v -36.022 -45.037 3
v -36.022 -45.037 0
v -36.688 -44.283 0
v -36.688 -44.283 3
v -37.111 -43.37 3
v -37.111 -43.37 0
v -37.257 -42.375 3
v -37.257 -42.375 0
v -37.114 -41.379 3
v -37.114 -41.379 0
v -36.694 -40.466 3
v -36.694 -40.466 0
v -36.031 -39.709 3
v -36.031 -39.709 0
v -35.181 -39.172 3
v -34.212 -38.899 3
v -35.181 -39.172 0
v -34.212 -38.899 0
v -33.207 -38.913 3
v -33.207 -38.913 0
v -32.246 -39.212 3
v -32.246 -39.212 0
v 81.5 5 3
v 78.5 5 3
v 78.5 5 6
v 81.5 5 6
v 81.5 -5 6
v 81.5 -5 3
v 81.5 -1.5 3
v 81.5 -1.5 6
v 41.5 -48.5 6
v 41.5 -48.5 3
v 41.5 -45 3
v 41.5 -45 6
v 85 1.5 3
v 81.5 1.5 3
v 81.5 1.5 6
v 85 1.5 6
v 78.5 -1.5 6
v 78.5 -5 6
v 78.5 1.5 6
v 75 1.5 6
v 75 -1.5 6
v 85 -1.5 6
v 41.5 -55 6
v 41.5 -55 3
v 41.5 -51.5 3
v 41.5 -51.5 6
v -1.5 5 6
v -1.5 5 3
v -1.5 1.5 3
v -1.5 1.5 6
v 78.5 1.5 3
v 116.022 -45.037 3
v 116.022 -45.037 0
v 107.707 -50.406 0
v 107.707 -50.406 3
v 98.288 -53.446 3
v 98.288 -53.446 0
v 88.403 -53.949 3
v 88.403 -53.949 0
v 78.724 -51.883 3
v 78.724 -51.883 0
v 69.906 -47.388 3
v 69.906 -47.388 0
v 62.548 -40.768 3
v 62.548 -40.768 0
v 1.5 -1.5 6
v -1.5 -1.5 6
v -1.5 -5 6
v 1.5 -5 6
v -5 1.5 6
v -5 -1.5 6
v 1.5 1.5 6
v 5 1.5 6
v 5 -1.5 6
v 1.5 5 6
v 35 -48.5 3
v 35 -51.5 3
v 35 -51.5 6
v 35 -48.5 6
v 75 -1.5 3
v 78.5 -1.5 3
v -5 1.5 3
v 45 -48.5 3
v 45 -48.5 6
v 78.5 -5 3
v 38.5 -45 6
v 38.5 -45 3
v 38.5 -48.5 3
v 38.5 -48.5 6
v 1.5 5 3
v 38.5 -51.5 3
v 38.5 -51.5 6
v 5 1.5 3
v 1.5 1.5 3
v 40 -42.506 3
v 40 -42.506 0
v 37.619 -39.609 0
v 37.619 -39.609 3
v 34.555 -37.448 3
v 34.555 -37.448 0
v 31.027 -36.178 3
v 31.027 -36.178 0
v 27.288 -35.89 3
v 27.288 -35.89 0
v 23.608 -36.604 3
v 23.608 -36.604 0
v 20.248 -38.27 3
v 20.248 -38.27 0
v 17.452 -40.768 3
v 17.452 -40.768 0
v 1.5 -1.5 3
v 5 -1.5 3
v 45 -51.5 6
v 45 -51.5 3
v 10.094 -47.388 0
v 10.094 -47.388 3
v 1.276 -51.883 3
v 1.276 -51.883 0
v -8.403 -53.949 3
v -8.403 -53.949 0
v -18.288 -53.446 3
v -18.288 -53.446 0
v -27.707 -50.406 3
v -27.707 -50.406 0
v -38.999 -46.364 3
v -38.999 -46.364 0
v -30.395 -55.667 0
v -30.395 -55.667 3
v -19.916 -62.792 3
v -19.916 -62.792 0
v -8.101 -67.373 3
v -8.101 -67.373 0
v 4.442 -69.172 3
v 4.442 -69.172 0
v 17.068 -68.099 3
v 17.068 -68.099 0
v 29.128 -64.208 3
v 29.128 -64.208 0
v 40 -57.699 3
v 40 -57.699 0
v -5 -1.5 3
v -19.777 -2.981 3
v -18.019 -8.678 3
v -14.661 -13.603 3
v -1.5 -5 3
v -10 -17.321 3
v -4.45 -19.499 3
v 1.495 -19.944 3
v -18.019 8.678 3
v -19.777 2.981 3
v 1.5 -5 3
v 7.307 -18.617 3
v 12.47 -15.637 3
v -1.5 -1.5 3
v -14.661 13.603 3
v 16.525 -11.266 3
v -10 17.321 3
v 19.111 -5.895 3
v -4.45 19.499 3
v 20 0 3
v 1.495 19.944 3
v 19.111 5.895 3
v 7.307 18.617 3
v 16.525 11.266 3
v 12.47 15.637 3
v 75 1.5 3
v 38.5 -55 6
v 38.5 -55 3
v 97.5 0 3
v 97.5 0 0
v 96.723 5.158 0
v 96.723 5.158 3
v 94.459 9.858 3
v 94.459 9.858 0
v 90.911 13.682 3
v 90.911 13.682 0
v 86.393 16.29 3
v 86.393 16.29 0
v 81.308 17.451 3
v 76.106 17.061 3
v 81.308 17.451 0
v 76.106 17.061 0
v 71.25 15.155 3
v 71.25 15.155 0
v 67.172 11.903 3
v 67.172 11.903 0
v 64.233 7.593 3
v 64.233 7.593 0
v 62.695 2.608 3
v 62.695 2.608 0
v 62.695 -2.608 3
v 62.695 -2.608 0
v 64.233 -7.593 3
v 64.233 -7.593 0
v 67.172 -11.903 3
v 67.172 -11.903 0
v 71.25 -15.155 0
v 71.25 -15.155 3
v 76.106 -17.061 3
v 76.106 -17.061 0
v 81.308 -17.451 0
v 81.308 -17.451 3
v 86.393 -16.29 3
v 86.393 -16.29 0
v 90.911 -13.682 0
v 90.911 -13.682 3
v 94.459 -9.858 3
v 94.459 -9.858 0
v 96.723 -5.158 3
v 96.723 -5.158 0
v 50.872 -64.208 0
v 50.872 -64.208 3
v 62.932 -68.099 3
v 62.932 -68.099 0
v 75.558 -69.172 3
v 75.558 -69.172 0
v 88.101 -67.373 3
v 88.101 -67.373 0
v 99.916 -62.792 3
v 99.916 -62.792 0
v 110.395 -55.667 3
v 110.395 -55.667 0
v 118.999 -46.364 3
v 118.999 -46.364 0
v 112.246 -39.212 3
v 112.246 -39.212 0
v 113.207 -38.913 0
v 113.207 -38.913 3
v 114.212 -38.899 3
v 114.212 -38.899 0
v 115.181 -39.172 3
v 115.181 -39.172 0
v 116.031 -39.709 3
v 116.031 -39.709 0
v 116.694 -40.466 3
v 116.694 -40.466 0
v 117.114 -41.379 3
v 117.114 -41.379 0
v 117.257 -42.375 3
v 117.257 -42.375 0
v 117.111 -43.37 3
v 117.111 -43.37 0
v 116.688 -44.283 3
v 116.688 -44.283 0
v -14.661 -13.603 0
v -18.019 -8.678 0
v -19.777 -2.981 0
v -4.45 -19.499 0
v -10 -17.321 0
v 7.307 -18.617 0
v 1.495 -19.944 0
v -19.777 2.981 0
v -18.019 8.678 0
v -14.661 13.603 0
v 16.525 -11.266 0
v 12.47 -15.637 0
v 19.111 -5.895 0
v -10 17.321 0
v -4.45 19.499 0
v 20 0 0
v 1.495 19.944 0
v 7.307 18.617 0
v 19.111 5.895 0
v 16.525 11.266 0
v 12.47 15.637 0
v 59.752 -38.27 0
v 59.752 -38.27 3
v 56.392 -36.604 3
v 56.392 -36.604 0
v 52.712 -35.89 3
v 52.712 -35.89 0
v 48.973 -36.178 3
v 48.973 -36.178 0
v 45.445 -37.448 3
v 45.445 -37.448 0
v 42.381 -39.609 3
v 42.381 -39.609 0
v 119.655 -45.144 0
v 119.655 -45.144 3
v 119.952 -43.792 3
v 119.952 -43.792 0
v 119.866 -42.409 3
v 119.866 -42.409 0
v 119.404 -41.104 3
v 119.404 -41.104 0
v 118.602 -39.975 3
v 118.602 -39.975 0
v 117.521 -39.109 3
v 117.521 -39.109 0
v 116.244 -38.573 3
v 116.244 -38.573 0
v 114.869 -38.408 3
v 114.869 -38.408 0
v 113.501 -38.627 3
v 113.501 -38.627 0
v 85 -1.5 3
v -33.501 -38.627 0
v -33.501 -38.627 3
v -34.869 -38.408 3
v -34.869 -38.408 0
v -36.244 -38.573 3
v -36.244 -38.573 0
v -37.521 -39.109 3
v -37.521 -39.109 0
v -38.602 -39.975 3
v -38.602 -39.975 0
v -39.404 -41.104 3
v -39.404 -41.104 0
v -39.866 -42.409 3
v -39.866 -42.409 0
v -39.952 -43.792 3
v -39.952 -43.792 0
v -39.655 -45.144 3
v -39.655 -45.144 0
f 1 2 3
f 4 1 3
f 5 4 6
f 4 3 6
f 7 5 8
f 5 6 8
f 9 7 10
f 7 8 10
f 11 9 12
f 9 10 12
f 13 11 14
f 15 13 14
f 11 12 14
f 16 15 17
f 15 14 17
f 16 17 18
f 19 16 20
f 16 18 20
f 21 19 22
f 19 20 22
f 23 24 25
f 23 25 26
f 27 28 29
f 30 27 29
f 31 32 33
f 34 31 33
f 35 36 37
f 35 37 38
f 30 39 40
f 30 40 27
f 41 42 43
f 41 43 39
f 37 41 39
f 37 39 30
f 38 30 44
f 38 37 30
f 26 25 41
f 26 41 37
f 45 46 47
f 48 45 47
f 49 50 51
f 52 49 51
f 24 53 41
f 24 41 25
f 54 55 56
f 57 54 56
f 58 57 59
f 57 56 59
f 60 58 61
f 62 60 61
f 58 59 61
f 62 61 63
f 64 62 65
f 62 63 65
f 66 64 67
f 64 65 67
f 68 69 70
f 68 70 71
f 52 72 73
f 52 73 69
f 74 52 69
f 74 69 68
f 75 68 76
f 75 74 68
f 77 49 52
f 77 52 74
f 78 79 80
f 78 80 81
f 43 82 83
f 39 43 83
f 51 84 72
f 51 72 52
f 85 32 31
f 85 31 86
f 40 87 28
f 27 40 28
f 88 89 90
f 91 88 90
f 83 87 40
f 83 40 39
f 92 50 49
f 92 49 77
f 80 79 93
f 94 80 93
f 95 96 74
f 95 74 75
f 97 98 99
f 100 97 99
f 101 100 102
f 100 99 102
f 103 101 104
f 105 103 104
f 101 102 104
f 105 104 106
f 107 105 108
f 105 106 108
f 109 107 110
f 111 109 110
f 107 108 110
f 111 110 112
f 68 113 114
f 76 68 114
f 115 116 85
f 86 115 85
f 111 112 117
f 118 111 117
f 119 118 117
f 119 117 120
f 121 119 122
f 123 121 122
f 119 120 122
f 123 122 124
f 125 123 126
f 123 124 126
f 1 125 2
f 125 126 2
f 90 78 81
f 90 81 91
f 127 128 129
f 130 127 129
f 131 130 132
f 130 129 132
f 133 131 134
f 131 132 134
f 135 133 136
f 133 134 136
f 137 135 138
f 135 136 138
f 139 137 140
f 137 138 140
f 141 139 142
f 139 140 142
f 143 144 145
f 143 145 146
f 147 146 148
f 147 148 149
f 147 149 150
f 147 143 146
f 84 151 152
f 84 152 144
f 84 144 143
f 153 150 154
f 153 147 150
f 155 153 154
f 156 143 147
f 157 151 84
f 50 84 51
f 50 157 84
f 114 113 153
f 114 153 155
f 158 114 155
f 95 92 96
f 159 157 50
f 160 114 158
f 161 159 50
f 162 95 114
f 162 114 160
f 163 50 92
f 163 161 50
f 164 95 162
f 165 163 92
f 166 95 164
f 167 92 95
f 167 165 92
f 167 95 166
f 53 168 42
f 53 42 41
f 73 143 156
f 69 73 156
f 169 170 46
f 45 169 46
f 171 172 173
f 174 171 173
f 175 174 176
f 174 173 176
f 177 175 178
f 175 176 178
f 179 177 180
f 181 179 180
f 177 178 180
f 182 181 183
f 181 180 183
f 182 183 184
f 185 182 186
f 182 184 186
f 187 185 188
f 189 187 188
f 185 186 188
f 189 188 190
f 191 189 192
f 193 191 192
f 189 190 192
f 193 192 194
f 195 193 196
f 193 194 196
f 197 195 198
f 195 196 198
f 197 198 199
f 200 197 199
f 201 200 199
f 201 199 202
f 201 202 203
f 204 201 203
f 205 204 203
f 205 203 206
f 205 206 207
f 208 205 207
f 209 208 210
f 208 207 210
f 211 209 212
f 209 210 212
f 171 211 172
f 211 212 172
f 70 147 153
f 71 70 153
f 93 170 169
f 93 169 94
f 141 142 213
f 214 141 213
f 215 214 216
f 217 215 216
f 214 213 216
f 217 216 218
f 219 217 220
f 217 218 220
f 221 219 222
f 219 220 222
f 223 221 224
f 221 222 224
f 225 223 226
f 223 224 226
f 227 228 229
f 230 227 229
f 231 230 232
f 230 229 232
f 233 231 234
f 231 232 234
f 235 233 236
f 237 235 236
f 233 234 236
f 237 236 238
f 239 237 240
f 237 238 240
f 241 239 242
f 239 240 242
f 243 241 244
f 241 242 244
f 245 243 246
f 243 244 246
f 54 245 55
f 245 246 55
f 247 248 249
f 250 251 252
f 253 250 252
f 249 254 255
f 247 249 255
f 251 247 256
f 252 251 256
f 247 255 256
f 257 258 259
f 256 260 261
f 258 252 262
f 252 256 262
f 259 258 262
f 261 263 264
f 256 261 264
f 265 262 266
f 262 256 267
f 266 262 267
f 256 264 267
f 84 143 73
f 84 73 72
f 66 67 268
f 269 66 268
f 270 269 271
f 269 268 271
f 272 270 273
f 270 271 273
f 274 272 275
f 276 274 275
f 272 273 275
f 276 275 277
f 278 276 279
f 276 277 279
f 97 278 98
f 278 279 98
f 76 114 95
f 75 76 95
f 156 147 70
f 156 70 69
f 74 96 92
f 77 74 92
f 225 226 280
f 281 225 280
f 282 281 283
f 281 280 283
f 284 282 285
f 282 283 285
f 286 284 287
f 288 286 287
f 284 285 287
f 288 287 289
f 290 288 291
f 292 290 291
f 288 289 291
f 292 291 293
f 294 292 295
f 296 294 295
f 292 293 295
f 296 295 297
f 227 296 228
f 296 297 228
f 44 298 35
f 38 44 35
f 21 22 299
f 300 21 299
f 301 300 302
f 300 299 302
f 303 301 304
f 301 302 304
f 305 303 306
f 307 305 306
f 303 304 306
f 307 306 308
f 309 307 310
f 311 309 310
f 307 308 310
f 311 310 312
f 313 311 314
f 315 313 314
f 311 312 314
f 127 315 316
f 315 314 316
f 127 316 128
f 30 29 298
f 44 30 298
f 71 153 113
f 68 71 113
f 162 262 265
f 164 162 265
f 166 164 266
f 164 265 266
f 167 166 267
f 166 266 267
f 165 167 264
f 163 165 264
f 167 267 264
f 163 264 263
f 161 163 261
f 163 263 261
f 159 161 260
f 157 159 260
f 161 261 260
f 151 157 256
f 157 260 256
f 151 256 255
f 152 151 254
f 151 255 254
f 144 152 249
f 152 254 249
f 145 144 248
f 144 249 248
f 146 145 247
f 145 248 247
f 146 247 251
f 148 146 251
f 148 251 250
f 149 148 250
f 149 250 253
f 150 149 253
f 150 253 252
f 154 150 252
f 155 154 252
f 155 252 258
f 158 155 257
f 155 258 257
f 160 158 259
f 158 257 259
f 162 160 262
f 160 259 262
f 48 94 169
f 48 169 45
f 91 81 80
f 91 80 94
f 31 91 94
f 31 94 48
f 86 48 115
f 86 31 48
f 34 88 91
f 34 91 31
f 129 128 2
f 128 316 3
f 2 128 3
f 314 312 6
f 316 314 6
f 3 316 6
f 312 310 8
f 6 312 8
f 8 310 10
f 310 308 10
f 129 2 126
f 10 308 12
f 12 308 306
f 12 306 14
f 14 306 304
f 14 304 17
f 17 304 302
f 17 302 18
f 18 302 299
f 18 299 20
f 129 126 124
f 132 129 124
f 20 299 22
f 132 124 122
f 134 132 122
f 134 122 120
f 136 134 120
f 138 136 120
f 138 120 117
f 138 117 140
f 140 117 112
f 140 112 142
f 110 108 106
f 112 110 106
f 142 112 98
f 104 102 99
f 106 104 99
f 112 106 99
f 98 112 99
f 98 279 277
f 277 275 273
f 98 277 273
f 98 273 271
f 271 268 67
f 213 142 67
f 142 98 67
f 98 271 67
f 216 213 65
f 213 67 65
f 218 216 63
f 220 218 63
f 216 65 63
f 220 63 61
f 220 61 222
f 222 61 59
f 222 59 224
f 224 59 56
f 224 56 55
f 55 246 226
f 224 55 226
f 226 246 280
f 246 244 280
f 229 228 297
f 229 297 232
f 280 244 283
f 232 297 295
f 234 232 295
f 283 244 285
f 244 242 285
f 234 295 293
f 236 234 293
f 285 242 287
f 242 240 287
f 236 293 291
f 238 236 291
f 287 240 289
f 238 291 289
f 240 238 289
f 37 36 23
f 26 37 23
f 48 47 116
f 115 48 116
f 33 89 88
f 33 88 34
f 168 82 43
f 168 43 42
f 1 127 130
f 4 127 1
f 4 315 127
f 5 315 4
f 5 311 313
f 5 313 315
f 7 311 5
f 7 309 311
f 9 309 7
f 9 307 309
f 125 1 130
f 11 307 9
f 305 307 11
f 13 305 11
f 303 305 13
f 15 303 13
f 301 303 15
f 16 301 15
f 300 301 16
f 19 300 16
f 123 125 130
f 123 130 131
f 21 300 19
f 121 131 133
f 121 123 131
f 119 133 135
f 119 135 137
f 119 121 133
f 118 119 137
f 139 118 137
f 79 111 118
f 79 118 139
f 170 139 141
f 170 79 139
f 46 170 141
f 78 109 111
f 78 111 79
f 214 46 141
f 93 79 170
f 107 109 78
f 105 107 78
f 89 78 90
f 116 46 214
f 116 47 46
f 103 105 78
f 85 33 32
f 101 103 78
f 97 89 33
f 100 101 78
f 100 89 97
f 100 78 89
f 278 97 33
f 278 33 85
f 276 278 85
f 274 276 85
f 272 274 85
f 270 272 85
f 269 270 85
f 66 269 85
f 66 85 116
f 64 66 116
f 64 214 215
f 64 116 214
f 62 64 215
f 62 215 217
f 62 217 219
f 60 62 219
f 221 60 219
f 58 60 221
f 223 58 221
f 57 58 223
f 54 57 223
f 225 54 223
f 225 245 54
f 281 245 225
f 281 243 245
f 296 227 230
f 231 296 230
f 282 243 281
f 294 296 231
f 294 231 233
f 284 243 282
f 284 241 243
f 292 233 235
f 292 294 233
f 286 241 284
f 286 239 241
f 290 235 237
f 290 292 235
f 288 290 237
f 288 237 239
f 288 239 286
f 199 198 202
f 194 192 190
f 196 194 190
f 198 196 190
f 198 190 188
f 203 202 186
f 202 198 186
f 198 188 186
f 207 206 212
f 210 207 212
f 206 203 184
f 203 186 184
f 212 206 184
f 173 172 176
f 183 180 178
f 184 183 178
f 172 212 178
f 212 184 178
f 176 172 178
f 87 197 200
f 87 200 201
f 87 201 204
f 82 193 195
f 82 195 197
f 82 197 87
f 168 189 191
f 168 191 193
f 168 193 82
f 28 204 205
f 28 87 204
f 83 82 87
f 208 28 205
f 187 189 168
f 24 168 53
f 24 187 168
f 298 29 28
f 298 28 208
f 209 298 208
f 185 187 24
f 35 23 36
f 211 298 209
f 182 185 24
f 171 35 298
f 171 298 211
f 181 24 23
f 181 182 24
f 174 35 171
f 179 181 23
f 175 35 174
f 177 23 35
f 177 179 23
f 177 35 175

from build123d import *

# Parameters (mm, degrees)
F0_R     = 20
F1_DEPTH = 3
F0_R_2   = 17.5
F2_W     = 3
F2_H     = 3.5
F2_H_2   = 3
F2_W_2   = 3.5
F3_DEPTH = 3


with BuildPart() as f1:
    # F0 (on Top) → F1 (new body)
    with BuildSketch(Plane.XY):
        Circle(F0_R)
    extrude(amount=F1_DEPTH)

    # F2 (on face) → F3 (join)
    with BuildSketch(Plane.XY.offset(3)):
        with Locations((0, 3.25)):
            Rectangle(F2_W, F2_H)
        Rectangle(F2_W, F2_H_2)
        with Locations((-3.25, 0)):
            Rectangle(F2_W_2, F2_H_2)
        with Locations((3.25, 0)):
            Rectangle(F2_W_2, F2_H_2)
        with Locations((0, -3.25)):
            Rectangle(F2_W, F2_H)
    extrude(amount=F3_DEPTH)


with BuildPart() as f1b:
    # F0 (on Top) → F1, piece 2 (new body)
    with BuildSketch(Plane.XY):
        with Locations((80, 0)):
            Circle(F0_R_2)
    extrude(amount=F1_DEPTH)

    # F2 (on face) → F3, piece 2 (join)
    with BuildSketch(Plane.XY.offset(3)):
        with Locations((80, 3.25)):
            Rectangle(F2_W, F2_H)
        with Locations((76.75, 0)):
            Rectangle(F2_W_2, F2_H_2)
        with Locations((80, 0)):
            Rectangle(F2_W, F2_H_2)
        with Locations((83.25, 0)):
            Rectangle(F2_W_2, F2_H_2)
        with Locations((80, -3.25)):
            Rectangle(F2_W, F2_H)
    extrude(amount=F3_DEPTH)


with BuildPart() as f1c:
    # F0 (on Top) → F1, piece 3 (new body)
    with BuildSketch(Plane.XY):
        with BuildLine():
            ThreePointArc((62.5483958907, -40.7677120506), (50.8326300349, -35.9082805882), (40, -42.5058081746))
            ThreePointArc((40, -42.5058081746), (29.1673699651, -35.9082805882), (17.4516041093, -40.7677120506))
            ThreePointArc((17.4516041093, -40.7677120506), (-8.4033131949, -53.9494336876), (-36.022333509, -45.0374052423))
            ThreePointArc((-36.022333509, -45.0374052423), (-36.6939821603, -40.465557931), (-32.2462852457, -39.2122056641))
            ThreePointArc((-32.2462852457, -39.2122056641), (-38.6022003017, -39.9747543309), (-38.9988817551, -46.3639468067))
            ThreePointArc((-38.9988817551, -46.3639468067), (-1.8809505058, -68.6292182352), (40, -57.6990253387))
            ThreePointArc((40, -57.6990253387), (81.8809505058, -68.6292182352), (118.9988817551, -46.3639468067))
            ThreePointArc((118.9988817551, -46.3639468067), (118.6022003017, -39.9747543309), (112.2462852457, -39.2122056641))
            ThreePointArc((112.2462852457, -39.2122056641), (116.6939821603, -40.465557931), (116.022333509, -45.0374052423))
            ThreePointArc((116.022333509, -45.0374052423), (88.4033131949, -53.9494336876), (62.5483958907, -40.7677120506))
        make_face()
    extrude(amount=F1_DEPTH)

    # F2 (on face) → F3, piece 3 (join)
    with BuildSketch(Plane.XY.offset(3)):
        with Locations((40, -46.75)):
            Rectangle(F2_W, F2_H)
        with Locations((40, -50)):
            Rectangle(F2_W, F2_H_2)
        with Locations((36.75, -50)):
            Rectangle(F2_W_2, F2_H_2)
        with Locations((43.25, -50)):
            Rectangle(F2_W_2, F2_H_2)
        with Locations((40, -53.25)):
            Rectangle(F2_W, F2_H)
    extrude(amount=F3_DEPTH)


solid = Compound([f1.part, f1b.part, f1c.part])
